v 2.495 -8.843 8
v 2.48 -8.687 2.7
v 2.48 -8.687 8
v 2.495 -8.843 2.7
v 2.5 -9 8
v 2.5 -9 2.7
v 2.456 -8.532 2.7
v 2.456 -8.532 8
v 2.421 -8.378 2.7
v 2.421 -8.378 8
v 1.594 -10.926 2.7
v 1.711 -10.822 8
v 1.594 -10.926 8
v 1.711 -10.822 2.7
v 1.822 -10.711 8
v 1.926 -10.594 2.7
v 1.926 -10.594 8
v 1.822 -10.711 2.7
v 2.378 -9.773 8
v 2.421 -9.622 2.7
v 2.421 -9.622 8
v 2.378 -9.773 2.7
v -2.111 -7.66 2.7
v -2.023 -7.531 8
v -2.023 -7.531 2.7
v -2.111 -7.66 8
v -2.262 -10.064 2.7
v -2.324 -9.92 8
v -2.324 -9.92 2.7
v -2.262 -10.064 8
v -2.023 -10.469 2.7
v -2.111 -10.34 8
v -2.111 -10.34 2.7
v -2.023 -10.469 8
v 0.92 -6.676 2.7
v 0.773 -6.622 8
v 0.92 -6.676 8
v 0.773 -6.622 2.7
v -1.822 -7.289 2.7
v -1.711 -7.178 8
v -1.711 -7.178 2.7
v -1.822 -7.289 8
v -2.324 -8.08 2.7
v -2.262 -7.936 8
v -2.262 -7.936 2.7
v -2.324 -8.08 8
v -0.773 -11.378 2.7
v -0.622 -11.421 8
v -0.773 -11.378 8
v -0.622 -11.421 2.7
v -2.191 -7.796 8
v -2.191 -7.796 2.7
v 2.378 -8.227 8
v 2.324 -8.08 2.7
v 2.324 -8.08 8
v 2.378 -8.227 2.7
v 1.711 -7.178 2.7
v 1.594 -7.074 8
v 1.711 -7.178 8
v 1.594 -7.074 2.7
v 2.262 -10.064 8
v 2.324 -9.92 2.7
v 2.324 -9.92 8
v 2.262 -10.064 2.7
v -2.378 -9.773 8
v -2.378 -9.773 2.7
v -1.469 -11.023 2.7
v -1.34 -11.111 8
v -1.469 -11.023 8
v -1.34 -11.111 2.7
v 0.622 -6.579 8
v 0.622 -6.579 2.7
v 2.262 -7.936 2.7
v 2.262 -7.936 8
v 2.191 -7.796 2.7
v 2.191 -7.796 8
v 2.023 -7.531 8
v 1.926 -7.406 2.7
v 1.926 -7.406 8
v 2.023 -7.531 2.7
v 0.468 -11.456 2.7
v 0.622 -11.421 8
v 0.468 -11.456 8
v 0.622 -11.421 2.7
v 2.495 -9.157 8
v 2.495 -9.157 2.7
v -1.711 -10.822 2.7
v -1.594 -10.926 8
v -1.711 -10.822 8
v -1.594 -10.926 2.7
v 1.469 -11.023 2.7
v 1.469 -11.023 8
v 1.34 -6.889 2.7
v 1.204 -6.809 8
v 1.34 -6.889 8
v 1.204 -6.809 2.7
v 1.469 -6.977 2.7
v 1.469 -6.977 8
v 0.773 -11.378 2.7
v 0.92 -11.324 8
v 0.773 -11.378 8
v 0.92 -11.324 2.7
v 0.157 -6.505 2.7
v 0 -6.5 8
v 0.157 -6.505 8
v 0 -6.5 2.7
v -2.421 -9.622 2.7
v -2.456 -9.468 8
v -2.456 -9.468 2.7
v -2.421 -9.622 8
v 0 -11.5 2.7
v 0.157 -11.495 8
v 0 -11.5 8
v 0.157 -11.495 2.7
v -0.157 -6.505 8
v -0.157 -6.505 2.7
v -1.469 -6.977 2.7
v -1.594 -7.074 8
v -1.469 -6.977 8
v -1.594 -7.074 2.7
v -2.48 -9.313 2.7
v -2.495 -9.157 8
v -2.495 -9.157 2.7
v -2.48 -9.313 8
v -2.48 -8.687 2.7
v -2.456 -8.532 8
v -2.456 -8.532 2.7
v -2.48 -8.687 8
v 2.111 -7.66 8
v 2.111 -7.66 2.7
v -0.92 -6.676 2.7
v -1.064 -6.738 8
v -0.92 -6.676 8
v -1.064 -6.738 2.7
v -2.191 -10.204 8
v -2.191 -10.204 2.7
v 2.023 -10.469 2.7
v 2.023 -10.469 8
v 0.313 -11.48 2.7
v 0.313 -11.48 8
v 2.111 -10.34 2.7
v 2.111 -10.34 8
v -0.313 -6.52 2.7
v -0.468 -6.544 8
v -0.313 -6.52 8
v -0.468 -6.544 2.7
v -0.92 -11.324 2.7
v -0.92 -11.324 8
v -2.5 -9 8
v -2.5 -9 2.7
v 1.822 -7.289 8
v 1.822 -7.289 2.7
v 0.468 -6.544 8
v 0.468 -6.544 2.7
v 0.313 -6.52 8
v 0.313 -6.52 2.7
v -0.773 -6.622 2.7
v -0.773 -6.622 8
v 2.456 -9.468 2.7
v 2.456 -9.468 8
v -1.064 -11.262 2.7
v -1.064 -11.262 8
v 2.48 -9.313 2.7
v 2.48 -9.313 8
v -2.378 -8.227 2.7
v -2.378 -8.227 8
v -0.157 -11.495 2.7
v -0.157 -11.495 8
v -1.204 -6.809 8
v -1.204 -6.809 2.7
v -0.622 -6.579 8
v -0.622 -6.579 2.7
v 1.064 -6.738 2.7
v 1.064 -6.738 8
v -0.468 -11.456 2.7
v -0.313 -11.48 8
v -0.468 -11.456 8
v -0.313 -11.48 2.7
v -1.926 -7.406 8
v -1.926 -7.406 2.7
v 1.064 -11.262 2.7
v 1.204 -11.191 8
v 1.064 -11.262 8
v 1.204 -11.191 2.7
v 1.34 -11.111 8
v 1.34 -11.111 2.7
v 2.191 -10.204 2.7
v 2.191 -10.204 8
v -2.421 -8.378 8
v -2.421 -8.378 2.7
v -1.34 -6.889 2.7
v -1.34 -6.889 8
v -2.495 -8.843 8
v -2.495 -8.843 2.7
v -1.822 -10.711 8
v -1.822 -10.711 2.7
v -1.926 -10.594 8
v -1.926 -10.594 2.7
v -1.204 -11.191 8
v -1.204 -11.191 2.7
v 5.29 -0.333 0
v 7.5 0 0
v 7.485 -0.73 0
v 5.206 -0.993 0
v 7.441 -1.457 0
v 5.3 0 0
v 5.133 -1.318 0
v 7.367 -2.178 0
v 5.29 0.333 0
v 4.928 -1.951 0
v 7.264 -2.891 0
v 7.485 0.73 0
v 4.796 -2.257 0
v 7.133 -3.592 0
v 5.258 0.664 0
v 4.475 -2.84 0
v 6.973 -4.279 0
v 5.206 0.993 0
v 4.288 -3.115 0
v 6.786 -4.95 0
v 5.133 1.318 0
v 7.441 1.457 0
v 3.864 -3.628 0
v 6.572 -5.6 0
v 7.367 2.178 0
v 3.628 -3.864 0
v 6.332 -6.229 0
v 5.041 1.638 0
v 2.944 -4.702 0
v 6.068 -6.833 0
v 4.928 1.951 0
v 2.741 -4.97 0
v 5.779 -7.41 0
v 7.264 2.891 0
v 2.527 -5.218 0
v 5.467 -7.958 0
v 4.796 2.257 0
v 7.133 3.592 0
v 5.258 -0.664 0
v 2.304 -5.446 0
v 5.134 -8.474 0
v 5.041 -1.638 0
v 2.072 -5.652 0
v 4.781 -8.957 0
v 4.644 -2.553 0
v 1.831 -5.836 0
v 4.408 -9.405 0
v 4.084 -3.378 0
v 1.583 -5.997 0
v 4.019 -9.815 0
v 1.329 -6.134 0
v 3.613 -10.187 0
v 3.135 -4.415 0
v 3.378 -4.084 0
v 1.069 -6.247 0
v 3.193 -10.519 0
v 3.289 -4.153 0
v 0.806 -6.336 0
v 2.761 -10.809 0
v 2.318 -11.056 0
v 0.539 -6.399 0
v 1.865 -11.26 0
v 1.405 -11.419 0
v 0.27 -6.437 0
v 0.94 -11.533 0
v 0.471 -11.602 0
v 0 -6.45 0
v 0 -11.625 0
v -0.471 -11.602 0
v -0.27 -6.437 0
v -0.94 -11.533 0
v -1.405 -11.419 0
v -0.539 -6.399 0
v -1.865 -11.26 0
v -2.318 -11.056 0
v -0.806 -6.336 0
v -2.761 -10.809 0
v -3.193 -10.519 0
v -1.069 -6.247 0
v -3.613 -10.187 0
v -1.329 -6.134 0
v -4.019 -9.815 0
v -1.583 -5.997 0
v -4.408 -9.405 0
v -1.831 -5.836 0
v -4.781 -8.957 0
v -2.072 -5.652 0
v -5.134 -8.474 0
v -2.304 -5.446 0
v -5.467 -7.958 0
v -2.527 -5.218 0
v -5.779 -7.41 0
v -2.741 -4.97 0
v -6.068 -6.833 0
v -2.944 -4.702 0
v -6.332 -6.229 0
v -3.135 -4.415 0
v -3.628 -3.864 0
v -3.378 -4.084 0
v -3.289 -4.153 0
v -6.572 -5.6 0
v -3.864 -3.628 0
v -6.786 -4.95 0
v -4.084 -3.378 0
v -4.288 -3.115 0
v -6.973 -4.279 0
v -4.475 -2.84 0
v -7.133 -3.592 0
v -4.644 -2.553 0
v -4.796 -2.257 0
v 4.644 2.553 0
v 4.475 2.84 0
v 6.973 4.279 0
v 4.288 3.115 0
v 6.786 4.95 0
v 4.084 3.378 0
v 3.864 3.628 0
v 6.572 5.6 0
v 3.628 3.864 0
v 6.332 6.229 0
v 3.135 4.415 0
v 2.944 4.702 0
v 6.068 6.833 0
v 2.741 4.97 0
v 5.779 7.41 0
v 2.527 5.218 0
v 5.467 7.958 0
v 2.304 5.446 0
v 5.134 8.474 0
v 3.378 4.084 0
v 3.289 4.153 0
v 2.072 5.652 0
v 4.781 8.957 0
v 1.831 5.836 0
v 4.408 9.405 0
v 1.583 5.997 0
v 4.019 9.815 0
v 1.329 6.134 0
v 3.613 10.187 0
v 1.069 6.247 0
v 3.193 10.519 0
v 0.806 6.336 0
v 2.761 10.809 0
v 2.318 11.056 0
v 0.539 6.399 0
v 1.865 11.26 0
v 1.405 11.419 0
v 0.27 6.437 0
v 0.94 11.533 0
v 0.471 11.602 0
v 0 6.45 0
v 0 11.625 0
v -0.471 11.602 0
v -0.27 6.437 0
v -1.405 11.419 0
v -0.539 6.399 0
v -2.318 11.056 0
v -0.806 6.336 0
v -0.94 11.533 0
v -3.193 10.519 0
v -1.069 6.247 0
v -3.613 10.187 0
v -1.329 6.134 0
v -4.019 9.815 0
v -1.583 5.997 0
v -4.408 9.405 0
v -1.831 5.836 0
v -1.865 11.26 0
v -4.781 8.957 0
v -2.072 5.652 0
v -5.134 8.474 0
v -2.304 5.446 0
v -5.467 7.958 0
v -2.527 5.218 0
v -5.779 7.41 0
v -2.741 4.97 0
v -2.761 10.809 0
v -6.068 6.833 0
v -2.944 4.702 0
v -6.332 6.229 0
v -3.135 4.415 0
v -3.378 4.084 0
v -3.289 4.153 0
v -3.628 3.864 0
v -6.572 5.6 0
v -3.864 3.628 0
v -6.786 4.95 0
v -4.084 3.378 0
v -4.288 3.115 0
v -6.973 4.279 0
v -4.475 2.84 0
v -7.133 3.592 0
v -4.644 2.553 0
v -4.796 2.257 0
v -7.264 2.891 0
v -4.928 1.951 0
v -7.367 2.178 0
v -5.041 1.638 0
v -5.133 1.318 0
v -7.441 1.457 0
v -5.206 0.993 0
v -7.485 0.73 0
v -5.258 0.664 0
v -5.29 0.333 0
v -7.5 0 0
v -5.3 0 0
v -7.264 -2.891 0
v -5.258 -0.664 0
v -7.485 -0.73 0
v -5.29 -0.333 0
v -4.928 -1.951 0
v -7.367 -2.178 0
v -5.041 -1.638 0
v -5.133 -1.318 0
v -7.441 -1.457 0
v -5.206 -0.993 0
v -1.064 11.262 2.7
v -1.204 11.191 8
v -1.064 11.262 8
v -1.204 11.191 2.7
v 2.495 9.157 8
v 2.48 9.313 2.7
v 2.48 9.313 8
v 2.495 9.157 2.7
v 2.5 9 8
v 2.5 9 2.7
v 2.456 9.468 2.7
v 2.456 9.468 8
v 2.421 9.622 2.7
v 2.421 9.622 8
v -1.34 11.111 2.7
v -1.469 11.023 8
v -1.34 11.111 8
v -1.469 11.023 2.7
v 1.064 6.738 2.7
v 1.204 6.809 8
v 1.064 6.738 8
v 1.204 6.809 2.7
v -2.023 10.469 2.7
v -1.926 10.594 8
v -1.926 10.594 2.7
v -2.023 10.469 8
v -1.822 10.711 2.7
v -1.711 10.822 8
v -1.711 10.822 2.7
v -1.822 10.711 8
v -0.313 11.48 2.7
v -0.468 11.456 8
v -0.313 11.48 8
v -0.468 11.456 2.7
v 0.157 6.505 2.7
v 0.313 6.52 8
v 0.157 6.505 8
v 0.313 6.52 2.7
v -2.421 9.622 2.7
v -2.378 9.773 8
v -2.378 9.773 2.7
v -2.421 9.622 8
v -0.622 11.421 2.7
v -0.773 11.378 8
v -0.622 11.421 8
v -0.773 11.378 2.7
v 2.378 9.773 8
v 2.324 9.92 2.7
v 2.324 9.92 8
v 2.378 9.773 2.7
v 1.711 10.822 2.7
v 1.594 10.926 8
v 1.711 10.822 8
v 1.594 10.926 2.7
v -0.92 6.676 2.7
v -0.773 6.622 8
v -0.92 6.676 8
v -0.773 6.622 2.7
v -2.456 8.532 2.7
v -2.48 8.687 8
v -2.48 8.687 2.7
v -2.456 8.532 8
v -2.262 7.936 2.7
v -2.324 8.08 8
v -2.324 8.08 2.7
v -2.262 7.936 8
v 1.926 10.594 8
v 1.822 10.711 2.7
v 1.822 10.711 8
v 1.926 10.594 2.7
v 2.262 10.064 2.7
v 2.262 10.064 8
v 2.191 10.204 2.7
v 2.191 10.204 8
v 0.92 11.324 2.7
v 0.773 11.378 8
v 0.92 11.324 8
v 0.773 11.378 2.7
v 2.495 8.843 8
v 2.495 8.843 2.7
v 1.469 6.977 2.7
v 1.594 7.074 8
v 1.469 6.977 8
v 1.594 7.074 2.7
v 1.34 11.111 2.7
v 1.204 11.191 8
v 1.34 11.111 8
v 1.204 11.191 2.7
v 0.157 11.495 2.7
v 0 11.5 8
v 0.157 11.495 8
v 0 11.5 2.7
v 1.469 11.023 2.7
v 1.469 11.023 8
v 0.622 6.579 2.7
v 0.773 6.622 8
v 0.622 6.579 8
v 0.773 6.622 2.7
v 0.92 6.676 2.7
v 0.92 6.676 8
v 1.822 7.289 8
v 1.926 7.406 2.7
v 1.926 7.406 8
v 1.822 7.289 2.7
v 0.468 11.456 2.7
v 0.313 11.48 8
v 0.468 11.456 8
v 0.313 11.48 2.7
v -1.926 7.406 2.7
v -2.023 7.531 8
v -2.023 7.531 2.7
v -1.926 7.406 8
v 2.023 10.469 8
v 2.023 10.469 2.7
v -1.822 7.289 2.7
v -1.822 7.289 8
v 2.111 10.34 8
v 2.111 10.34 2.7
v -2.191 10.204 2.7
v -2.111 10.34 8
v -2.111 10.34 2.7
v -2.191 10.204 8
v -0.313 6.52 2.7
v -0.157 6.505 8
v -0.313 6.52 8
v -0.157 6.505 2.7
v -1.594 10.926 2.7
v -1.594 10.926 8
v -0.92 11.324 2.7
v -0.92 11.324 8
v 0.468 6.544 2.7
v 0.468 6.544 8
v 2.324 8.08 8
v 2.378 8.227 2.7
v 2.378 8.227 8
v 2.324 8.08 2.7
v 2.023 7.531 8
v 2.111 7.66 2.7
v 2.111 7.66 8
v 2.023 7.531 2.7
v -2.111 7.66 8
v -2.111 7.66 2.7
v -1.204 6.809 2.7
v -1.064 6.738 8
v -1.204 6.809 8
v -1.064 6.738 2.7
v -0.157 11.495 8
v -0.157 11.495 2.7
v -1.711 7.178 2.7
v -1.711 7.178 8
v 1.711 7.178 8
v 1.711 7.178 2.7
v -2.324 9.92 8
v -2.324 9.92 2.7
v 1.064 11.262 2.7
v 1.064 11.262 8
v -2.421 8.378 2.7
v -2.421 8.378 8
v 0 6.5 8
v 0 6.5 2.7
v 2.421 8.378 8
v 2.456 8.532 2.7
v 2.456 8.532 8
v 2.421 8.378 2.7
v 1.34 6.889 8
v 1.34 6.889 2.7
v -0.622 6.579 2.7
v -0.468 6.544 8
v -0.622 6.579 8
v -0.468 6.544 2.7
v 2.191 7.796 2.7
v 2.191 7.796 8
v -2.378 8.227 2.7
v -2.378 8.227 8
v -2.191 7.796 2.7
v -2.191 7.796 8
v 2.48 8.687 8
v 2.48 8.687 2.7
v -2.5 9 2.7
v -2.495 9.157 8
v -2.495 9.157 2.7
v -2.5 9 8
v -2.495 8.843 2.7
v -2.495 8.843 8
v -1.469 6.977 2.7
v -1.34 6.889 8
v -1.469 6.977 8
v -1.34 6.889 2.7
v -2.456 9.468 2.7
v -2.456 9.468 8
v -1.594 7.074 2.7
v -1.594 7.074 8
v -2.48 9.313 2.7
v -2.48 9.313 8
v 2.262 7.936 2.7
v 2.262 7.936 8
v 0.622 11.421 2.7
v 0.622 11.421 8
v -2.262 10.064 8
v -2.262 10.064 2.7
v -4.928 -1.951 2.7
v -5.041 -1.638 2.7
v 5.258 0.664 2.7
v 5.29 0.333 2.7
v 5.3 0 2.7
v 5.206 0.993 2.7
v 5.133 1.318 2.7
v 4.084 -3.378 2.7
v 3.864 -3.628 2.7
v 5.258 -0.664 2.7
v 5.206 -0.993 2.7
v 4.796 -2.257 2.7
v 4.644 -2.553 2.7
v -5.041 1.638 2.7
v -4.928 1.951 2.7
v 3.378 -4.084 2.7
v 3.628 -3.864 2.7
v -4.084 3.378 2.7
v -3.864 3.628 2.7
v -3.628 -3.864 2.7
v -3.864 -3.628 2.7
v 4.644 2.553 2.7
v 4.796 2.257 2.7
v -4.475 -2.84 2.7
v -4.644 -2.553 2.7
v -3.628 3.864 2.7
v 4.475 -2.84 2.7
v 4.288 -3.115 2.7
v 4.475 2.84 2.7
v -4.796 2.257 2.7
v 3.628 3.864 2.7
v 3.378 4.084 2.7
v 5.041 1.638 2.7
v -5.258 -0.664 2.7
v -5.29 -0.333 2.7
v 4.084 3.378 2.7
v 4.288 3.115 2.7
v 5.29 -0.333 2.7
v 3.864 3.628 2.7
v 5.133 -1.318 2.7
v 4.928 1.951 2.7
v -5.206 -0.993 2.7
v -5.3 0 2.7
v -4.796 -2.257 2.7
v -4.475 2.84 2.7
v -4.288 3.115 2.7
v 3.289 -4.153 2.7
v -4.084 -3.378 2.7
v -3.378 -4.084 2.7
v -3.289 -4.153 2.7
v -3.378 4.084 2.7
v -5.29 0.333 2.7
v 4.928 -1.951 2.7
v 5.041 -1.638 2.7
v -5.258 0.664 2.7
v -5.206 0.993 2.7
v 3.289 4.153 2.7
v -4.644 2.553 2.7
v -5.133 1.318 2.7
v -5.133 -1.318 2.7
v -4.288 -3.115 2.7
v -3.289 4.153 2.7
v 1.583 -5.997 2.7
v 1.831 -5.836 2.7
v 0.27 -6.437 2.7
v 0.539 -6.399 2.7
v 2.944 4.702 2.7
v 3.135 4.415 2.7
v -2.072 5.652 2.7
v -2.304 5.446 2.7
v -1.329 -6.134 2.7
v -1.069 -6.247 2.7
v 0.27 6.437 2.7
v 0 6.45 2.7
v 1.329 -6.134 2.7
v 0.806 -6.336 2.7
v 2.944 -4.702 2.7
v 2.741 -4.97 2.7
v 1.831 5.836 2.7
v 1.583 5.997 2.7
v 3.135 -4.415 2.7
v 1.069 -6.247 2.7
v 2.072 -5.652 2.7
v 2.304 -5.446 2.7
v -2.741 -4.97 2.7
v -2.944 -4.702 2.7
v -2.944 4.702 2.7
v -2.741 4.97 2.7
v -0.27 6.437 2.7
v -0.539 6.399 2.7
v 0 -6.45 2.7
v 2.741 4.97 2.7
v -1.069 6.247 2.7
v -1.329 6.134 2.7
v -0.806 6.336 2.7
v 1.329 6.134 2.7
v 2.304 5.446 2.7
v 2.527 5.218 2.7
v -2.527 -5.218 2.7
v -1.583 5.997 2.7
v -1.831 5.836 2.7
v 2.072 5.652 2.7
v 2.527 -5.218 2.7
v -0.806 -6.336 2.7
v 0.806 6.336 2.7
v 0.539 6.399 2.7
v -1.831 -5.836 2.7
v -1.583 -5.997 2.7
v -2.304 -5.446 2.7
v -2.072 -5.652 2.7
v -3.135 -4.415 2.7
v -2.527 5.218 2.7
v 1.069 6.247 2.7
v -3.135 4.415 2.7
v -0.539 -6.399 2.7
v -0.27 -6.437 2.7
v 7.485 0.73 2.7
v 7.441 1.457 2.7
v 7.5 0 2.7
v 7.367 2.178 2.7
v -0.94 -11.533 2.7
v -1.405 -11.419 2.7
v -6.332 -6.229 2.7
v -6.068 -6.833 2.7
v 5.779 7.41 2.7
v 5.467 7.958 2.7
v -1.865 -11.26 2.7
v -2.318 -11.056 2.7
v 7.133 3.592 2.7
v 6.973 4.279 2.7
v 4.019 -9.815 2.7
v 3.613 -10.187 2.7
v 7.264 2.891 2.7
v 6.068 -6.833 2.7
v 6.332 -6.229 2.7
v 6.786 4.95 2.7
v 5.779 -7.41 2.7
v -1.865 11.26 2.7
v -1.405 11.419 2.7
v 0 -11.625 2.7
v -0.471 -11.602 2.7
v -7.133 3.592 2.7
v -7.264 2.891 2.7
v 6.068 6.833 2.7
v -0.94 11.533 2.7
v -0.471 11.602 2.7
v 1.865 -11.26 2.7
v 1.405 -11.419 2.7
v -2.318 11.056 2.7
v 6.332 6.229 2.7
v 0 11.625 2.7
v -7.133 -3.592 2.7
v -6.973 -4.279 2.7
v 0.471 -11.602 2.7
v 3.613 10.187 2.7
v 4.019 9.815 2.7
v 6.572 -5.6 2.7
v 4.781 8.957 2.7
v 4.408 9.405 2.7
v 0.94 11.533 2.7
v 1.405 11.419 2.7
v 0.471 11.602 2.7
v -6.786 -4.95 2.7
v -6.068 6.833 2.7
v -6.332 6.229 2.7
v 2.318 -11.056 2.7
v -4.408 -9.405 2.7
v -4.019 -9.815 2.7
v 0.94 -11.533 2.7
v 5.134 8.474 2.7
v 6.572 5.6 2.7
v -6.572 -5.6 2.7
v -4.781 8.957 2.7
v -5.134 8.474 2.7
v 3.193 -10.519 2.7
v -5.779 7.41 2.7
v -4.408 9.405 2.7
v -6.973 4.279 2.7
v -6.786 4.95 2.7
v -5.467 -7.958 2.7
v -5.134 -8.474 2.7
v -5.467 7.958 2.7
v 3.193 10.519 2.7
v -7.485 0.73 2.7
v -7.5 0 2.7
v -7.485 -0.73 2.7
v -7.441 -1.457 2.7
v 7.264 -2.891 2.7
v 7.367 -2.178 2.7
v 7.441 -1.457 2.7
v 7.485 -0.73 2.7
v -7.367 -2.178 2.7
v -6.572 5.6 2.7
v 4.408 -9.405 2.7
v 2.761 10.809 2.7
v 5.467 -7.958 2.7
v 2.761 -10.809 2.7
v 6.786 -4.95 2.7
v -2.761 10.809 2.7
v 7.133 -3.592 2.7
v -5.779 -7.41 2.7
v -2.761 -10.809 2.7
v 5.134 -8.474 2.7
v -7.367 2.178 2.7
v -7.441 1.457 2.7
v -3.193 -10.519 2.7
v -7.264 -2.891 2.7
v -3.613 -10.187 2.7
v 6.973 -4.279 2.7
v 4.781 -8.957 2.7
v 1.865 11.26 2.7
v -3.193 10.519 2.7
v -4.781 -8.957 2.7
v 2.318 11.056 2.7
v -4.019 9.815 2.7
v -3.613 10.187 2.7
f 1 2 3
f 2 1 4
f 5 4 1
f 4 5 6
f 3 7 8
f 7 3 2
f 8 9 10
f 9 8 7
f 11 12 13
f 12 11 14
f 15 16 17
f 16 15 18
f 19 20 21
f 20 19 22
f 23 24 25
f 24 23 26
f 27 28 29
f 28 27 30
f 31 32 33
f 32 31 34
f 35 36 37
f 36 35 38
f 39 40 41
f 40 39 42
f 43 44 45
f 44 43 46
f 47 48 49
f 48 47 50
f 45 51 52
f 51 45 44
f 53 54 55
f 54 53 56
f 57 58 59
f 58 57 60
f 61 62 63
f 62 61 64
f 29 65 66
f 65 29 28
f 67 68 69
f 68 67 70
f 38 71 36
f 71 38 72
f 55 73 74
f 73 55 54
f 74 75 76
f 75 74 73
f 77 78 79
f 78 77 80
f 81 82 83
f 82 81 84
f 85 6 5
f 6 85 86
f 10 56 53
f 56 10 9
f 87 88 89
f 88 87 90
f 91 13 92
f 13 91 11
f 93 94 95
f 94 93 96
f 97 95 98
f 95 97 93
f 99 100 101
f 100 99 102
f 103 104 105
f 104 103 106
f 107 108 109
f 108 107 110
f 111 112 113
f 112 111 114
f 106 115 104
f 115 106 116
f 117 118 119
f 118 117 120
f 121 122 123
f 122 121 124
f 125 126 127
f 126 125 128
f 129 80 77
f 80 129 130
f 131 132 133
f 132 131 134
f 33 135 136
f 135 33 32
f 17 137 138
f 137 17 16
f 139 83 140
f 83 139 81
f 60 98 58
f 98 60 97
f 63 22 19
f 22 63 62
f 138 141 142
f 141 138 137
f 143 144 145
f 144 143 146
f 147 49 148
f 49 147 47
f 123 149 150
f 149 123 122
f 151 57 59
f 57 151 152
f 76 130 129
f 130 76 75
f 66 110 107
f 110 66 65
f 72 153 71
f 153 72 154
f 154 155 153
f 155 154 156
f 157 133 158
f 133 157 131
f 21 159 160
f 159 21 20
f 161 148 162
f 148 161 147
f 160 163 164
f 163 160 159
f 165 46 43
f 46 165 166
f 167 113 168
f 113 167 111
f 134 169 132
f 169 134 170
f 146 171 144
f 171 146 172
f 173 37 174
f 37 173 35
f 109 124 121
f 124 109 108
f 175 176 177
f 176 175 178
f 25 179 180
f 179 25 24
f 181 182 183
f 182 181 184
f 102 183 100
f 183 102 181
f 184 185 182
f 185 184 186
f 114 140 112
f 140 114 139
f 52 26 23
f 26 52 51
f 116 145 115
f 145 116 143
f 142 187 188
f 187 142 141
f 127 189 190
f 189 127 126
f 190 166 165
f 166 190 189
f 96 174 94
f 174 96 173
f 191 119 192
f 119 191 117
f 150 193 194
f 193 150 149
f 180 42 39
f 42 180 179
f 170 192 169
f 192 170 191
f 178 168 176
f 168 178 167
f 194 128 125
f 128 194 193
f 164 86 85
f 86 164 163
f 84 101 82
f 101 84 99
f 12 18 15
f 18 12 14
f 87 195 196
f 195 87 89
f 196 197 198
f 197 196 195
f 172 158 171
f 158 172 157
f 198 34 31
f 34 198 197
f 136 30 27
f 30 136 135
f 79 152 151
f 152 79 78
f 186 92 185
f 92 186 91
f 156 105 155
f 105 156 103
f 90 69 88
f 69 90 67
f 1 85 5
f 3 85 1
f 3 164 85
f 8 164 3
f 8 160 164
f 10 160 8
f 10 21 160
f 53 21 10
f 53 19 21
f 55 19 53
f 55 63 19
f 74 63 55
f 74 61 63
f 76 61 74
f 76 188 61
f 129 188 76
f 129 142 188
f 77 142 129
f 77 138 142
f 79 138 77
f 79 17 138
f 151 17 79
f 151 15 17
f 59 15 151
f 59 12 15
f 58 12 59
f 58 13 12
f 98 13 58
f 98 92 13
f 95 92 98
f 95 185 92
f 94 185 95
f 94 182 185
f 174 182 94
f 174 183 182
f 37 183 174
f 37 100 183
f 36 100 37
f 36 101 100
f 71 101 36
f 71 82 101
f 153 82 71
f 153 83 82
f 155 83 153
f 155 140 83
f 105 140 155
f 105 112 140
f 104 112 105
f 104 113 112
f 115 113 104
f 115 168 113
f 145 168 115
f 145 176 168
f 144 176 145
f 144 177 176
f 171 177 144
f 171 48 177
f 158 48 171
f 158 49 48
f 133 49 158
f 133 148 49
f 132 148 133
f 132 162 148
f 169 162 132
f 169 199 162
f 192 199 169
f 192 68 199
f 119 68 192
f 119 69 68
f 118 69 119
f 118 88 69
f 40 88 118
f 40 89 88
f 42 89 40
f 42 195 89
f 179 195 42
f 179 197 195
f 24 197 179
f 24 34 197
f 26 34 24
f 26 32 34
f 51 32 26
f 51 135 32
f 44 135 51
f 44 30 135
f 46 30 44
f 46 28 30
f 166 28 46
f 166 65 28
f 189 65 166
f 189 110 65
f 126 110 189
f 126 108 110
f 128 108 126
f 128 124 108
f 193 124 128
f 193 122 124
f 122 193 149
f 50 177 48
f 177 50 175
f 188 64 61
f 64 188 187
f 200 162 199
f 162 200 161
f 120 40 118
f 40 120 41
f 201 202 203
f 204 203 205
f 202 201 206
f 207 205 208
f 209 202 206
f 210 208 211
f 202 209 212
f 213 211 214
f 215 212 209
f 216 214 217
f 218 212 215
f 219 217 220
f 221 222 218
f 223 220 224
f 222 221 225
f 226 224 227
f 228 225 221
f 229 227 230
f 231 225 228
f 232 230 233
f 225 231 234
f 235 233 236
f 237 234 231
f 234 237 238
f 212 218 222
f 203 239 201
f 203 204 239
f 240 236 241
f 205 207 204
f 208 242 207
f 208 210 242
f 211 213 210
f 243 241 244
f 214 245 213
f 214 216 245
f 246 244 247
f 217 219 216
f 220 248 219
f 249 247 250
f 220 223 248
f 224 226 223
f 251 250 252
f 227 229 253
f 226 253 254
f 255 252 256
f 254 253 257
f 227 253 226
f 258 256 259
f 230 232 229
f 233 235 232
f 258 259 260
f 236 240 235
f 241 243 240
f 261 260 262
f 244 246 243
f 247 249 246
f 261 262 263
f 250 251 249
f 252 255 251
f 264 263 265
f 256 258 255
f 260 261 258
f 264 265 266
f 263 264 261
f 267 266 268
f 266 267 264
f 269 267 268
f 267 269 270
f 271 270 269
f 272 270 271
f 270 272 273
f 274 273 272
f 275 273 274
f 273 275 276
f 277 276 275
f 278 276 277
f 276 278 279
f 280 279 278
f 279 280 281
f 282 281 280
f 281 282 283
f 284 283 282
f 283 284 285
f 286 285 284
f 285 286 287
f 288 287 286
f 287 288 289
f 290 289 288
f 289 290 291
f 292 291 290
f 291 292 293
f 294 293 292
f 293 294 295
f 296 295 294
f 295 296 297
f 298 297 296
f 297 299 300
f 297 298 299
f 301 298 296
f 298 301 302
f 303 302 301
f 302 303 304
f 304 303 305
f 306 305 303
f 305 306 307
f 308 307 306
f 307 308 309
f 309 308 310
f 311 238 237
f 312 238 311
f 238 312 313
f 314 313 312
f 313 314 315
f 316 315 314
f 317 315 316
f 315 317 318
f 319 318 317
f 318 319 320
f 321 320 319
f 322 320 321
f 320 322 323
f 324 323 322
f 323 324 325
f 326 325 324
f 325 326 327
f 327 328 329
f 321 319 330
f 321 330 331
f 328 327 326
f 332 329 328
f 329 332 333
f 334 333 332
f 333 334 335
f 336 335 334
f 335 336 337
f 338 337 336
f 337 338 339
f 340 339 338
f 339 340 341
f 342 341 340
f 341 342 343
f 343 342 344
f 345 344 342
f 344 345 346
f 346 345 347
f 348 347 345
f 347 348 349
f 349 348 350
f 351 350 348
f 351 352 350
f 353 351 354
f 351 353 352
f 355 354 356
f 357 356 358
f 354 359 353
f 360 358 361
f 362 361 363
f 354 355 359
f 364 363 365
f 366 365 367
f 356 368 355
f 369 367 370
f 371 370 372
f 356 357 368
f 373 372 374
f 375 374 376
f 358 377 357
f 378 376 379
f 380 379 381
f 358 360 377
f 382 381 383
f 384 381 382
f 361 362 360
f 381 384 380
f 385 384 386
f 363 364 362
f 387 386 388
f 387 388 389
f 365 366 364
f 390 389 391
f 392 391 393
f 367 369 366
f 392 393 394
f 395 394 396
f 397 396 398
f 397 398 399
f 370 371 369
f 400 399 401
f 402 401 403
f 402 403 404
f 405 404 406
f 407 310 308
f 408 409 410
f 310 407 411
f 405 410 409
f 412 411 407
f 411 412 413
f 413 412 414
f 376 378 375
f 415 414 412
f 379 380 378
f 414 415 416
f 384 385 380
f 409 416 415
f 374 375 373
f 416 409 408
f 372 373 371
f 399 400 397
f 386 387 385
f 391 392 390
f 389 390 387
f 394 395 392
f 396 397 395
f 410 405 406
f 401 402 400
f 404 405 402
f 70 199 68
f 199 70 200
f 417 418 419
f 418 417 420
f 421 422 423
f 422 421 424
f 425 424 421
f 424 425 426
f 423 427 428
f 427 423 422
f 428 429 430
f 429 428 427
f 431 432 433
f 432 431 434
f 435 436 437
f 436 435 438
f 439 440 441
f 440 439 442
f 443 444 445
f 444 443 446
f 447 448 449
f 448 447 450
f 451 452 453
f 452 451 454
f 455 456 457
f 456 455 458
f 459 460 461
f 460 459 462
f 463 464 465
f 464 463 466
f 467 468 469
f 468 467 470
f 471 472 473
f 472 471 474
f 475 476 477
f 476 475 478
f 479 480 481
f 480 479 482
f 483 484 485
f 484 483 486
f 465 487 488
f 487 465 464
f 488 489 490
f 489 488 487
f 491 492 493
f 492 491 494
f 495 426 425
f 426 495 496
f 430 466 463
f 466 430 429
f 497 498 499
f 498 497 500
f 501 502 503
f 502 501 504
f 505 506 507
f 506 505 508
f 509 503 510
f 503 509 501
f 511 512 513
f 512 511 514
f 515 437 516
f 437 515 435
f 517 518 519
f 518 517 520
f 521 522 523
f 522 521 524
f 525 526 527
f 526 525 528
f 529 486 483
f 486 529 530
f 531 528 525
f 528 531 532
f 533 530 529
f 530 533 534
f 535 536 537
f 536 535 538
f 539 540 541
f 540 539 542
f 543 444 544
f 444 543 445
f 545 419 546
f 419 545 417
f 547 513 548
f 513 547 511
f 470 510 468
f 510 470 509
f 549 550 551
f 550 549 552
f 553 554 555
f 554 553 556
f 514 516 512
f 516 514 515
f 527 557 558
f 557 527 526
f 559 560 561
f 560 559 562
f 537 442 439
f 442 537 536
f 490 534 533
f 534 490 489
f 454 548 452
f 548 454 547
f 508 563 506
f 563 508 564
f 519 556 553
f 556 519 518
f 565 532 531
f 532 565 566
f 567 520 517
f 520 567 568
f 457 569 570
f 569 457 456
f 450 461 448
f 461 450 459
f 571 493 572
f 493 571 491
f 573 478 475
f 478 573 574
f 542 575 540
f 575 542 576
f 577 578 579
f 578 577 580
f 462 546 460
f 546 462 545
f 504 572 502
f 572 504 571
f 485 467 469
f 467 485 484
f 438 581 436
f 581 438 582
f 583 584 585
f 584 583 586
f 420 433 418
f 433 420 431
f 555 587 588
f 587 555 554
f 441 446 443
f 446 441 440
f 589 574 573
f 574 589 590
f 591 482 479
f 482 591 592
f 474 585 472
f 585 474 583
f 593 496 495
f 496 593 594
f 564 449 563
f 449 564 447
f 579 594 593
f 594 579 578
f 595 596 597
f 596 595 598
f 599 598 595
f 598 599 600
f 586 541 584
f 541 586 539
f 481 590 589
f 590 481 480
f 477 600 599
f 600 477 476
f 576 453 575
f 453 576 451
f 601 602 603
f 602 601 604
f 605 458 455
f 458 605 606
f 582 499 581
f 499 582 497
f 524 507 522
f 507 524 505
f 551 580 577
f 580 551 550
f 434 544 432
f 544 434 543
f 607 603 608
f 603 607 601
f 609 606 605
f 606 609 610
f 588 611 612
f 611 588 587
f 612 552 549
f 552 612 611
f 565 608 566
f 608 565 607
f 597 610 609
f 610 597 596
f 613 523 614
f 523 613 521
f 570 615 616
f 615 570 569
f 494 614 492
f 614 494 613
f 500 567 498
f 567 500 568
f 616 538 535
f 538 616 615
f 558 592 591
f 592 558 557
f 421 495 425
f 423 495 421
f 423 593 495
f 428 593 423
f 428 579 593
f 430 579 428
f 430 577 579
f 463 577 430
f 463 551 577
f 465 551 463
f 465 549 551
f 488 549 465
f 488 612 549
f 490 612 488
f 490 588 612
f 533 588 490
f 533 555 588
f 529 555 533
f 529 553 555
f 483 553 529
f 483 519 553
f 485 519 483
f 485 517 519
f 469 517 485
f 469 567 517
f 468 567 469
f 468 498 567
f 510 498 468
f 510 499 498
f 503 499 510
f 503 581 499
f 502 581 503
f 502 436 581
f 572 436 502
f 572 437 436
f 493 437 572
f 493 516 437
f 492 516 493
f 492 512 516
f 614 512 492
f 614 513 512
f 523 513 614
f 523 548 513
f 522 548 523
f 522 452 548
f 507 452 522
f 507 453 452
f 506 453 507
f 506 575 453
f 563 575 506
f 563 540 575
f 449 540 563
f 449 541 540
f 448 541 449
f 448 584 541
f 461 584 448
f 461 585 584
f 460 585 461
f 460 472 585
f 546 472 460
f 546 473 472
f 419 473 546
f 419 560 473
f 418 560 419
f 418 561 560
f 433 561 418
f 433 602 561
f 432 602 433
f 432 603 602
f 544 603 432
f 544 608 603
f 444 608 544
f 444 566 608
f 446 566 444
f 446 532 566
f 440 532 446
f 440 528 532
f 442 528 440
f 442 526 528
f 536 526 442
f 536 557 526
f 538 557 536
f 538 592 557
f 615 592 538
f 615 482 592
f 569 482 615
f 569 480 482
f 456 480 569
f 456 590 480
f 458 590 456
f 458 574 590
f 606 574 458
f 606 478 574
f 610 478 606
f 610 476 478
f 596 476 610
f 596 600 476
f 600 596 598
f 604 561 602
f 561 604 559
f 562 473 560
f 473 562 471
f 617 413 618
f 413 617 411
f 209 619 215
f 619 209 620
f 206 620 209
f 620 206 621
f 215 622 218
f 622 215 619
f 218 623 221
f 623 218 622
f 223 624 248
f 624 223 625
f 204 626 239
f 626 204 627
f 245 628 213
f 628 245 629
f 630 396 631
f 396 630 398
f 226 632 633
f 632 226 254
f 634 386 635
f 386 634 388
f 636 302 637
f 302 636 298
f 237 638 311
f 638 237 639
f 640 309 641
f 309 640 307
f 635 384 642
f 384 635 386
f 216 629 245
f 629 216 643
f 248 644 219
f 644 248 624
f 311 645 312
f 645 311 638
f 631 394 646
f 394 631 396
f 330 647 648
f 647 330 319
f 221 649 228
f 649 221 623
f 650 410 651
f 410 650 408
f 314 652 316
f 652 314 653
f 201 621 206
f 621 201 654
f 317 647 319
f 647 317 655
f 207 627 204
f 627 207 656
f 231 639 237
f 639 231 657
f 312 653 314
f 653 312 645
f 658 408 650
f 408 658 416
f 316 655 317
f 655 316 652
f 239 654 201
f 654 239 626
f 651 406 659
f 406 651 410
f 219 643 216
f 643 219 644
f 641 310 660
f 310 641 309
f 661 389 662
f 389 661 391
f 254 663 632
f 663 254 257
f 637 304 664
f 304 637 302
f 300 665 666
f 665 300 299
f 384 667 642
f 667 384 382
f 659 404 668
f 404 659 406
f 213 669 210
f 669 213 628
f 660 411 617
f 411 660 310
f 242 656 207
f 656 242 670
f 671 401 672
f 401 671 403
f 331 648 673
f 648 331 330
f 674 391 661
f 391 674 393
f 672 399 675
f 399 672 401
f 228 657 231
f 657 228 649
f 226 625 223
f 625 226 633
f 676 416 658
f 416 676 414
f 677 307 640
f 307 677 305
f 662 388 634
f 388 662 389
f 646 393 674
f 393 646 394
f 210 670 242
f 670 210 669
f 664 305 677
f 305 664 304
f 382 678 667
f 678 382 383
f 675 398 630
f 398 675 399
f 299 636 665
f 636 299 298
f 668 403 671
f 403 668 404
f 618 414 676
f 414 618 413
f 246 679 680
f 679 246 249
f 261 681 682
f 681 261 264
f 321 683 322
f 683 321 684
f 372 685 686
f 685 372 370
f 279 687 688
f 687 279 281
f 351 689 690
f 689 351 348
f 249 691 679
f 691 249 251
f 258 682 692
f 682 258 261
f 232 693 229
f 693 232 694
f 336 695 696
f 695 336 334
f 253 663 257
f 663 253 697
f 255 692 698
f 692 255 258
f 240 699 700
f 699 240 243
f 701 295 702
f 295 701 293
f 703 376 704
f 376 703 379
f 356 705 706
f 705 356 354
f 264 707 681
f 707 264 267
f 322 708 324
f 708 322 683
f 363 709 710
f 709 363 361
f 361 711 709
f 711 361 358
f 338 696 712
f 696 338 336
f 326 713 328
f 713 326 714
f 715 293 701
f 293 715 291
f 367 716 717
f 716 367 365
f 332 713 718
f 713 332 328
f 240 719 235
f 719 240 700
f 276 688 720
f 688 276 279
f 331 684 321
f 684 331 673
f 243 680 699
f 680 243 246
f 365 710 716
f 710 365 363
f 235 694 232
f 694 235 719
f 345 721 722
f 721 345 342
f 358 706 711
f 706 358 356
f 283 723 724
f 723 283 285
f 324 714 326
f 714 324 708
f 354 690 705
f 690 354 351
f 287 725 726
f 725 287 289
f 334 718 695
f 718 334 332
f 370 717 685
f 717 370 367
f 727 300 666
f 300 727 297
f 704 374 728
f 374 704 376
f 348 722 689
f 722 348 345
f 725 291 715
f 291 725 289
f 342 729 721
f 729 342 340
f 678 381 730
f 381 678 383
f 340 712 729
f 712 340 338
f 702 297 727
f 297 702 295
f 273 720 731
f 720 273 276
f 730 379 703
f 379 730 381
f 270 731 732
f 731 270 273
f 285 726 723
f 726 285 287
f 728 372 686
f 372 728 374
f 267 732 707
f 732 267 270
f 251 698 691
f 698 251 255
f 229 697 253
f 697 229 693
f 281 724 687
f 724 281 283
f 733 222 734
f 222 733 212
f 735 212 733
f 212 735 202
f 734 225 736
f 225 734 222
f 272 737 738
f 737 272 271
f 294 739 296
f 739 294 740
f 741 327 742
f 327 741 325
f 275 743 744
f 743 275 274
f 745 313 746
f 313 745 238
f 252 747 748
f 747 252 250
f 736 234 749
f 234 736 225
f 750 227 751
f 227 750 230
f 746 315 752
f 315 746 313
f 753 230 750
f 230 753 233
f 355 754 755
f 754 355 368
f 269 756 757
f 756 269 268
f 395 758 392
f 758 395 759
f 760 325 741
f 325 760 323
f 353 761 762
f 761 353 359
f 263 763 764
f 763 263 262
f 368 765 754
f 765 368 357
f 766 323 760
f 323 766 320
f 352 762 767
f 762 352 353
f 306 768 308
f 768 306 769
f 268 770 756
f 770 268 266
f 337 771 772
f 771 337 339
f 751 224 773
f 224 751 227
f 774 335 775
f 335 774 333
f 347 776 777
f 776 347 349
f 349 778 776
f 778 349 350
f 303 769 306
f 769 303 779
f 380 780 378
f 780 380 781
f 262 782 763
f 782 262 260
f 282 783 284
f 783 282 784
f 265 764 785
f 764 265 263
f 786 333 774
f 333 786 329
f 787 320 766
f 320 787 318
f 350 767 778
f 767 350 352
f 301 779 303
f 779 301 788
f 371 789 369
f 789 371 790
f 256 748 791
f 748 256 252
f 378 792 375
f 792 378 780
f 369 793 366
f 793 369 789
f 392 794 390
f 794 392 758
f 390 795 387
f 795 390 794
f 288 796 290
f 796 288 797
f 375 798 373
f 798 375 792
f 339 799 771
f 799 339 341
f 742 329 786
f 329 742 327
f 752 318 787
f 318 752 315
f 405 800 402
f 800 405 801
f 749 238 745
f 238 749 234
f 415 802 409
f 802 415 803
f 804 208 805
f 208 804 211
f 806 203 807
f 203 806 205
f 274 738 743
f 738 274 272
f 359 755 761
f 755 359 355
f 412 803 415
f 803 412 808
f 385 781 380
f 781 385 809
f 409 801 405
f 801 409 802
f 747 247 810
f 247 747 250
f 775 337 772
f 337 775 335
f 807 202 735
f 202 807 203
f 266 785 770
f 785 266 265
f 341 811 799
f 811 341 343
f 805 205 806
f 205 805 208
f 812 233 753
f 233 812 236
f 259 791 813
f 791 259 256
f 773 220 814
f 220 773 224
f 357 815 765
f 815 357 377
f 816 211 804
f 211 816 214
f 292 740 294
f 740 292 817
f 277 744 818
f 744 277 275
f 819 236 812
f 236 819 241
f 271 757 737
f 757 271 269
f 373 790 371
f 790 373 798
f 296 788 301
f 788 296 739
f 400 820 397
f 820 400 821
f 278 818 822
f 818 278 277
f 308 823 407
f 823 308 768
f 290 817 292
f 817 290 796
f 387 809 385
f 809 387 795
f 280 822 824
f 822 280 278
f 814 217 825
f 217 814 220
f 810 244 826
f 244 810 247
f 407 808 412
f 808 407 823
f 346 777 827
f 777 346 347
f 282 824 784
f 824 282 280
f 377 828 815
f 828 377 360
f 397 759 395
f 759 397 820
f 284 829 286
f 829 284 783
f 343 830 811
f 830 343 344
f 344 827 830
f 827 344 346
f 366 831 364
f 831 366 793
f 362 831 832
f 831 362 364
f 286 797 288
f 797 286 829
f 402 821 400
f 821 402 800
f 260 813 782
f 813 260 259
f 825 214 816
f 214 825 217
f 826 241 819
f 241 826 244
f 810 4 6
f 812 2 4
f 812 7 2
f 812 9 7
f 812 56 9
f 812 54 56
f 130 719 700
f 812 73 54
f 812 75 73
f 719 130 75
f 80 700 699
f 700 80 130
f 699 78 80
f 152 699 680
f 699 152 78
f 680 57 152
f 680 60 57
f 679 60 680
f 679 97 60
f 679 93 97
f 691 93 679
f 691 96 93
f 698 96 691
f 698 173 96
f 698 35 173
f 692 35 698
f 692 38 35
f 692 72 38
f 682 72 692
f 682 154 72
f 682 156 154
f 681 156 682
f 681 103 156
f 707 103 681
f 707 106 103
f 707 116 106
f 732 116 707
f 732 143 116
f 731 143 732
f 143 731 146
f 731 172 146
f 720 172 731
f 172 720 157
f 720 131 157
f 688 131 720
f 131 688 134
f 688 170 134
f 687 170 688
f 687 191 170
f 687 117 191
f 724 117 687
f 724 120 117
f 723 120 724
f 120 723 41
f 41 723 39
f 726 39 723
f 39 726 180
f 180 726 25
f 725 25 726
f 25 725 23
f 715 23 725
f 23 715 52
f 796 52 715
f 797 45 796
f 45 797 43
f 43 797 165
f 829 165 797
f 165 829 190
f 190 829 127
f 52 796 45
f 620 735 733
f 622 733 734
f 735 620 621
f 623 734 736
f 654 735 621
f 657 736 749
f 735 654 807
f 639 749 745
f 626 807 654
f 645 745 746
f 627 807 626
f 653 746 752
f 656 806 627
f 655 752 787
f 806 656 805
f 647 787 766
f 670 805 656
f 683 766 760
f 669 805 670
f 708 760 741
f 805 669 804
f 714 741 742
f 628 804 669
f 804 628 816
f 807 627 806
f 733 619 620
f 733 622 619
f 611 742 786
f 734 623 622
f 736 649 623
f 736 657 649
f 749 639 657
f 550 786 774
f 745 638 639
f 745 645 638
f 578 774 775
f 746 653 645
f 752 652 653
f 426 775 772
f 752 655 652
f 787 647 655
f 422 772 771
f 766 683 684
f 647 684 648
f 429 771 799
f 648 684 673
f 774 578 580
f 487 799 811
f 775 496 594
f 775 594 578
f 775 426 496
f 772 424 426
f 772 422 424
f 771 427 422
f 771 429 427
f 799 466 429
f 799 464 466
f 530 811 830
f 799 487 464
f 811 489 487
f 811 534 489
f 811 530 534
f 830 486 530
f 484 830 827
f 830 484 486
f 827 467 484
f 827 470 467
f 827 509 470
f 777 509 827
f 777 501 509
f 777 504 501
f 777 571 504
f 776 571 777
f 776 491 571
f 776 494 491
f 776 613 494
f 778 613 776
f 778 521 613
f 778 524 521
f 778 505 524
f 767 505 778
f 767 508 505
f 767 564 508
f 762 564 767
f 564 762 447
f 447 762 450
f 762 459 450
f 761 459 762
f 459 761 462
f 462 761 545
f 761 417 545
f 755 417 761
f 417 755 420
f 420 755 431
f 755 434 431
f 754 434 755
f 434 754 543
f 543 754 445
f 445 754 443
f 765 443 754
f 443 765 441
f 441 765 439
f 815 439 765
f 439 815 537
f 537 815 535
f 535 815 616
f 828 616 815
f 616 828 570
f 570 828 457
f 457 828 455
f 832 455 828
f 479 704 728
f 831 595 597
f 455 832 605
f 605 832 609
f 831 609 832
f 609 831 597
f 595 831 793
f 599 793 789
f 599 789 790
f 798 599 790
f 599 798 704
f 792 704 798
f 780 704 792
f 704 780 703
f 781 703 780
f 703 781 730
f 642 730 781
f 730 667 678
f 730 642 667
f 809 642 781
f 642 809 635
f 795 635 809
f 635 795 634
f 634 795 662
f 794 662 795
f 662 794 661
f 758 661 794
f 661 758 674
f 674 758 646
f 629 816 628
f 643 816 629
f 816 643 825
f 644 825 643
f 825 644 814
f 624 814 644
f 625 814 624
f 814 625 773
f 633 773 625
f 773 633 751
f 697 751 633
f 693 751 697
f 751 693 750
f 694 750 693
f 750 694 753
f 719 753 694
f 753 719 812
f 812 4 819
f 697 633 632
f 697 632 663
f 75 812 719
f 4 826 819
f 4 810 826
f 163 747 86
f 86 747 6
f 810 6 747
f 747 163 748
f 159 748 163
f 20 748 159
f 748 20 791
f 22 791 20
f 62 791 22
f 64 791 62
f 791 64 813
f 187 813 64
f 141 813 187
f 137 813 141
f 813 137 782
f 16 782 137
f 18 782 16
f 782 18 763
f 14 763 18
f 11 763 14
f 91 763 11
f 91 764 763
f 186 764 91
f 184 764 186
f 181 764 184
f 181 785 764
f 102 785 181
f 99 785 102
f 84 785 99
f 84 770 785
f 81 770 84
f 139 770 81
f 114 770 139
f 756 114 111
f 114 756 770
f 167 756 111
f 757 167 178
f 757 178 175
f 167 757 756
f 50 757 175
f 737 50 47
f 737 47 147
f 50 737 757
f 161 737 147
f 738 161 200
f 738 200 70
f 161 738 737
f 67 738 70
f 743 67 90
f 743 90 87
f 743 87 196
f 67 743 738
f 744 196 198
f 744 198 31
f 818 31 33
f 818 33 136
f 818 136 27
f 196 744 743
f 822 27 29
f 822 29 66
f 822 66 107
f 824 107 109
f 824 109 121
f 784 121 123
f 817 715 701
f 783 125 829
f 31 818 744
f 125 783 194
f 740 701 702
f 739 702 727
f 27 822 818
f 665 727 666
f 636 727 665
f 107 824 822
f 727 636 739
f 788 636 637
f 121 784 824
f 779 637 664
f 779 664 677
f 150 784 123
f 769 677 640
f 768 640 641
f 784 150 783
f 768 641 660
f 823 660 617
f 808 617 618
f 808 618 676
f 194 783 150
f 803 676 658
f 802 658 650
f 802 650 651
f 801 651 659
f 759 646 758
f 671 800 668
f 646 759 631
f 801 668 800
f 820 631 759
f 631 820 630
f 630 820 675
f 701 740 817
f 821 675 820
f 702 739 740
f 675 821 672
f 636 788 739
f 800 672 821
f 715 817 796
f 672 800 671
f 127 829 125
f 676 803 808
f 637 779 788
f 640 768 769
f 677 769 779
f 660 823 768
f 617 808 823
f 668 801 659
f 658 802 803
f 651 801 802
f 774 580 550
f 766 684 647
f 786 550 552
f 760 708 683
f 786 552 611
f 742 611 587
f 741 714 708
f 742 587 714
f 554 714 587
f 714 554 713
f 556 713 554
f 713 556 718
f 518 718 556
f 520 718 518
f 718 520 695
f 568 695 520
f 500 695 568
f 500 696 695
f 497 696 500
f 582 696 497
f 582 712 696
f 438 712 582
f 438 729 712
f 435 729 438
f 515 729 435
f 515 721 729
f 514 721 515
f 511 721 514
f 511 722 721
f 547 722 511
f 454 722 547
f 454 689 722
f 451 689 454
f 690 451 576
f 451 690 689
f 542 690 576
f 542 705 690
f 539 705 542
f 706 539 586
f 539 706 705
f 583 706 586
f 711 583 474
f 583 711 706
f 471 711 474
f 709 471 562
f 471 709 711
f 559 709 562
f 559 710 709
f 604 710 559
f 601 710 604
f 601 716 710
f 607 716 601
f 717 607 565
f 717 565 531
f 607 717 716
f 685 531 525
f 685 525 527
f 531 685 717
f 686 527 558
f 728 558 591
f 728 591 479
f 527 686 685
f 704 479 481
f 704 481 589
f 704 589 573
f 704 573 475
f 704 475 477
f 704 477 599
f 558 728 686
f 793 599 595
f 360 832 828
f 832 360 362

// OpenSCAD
use <mobility_base.scad>;

$fn=100;
  
mobility_base_attachment();
